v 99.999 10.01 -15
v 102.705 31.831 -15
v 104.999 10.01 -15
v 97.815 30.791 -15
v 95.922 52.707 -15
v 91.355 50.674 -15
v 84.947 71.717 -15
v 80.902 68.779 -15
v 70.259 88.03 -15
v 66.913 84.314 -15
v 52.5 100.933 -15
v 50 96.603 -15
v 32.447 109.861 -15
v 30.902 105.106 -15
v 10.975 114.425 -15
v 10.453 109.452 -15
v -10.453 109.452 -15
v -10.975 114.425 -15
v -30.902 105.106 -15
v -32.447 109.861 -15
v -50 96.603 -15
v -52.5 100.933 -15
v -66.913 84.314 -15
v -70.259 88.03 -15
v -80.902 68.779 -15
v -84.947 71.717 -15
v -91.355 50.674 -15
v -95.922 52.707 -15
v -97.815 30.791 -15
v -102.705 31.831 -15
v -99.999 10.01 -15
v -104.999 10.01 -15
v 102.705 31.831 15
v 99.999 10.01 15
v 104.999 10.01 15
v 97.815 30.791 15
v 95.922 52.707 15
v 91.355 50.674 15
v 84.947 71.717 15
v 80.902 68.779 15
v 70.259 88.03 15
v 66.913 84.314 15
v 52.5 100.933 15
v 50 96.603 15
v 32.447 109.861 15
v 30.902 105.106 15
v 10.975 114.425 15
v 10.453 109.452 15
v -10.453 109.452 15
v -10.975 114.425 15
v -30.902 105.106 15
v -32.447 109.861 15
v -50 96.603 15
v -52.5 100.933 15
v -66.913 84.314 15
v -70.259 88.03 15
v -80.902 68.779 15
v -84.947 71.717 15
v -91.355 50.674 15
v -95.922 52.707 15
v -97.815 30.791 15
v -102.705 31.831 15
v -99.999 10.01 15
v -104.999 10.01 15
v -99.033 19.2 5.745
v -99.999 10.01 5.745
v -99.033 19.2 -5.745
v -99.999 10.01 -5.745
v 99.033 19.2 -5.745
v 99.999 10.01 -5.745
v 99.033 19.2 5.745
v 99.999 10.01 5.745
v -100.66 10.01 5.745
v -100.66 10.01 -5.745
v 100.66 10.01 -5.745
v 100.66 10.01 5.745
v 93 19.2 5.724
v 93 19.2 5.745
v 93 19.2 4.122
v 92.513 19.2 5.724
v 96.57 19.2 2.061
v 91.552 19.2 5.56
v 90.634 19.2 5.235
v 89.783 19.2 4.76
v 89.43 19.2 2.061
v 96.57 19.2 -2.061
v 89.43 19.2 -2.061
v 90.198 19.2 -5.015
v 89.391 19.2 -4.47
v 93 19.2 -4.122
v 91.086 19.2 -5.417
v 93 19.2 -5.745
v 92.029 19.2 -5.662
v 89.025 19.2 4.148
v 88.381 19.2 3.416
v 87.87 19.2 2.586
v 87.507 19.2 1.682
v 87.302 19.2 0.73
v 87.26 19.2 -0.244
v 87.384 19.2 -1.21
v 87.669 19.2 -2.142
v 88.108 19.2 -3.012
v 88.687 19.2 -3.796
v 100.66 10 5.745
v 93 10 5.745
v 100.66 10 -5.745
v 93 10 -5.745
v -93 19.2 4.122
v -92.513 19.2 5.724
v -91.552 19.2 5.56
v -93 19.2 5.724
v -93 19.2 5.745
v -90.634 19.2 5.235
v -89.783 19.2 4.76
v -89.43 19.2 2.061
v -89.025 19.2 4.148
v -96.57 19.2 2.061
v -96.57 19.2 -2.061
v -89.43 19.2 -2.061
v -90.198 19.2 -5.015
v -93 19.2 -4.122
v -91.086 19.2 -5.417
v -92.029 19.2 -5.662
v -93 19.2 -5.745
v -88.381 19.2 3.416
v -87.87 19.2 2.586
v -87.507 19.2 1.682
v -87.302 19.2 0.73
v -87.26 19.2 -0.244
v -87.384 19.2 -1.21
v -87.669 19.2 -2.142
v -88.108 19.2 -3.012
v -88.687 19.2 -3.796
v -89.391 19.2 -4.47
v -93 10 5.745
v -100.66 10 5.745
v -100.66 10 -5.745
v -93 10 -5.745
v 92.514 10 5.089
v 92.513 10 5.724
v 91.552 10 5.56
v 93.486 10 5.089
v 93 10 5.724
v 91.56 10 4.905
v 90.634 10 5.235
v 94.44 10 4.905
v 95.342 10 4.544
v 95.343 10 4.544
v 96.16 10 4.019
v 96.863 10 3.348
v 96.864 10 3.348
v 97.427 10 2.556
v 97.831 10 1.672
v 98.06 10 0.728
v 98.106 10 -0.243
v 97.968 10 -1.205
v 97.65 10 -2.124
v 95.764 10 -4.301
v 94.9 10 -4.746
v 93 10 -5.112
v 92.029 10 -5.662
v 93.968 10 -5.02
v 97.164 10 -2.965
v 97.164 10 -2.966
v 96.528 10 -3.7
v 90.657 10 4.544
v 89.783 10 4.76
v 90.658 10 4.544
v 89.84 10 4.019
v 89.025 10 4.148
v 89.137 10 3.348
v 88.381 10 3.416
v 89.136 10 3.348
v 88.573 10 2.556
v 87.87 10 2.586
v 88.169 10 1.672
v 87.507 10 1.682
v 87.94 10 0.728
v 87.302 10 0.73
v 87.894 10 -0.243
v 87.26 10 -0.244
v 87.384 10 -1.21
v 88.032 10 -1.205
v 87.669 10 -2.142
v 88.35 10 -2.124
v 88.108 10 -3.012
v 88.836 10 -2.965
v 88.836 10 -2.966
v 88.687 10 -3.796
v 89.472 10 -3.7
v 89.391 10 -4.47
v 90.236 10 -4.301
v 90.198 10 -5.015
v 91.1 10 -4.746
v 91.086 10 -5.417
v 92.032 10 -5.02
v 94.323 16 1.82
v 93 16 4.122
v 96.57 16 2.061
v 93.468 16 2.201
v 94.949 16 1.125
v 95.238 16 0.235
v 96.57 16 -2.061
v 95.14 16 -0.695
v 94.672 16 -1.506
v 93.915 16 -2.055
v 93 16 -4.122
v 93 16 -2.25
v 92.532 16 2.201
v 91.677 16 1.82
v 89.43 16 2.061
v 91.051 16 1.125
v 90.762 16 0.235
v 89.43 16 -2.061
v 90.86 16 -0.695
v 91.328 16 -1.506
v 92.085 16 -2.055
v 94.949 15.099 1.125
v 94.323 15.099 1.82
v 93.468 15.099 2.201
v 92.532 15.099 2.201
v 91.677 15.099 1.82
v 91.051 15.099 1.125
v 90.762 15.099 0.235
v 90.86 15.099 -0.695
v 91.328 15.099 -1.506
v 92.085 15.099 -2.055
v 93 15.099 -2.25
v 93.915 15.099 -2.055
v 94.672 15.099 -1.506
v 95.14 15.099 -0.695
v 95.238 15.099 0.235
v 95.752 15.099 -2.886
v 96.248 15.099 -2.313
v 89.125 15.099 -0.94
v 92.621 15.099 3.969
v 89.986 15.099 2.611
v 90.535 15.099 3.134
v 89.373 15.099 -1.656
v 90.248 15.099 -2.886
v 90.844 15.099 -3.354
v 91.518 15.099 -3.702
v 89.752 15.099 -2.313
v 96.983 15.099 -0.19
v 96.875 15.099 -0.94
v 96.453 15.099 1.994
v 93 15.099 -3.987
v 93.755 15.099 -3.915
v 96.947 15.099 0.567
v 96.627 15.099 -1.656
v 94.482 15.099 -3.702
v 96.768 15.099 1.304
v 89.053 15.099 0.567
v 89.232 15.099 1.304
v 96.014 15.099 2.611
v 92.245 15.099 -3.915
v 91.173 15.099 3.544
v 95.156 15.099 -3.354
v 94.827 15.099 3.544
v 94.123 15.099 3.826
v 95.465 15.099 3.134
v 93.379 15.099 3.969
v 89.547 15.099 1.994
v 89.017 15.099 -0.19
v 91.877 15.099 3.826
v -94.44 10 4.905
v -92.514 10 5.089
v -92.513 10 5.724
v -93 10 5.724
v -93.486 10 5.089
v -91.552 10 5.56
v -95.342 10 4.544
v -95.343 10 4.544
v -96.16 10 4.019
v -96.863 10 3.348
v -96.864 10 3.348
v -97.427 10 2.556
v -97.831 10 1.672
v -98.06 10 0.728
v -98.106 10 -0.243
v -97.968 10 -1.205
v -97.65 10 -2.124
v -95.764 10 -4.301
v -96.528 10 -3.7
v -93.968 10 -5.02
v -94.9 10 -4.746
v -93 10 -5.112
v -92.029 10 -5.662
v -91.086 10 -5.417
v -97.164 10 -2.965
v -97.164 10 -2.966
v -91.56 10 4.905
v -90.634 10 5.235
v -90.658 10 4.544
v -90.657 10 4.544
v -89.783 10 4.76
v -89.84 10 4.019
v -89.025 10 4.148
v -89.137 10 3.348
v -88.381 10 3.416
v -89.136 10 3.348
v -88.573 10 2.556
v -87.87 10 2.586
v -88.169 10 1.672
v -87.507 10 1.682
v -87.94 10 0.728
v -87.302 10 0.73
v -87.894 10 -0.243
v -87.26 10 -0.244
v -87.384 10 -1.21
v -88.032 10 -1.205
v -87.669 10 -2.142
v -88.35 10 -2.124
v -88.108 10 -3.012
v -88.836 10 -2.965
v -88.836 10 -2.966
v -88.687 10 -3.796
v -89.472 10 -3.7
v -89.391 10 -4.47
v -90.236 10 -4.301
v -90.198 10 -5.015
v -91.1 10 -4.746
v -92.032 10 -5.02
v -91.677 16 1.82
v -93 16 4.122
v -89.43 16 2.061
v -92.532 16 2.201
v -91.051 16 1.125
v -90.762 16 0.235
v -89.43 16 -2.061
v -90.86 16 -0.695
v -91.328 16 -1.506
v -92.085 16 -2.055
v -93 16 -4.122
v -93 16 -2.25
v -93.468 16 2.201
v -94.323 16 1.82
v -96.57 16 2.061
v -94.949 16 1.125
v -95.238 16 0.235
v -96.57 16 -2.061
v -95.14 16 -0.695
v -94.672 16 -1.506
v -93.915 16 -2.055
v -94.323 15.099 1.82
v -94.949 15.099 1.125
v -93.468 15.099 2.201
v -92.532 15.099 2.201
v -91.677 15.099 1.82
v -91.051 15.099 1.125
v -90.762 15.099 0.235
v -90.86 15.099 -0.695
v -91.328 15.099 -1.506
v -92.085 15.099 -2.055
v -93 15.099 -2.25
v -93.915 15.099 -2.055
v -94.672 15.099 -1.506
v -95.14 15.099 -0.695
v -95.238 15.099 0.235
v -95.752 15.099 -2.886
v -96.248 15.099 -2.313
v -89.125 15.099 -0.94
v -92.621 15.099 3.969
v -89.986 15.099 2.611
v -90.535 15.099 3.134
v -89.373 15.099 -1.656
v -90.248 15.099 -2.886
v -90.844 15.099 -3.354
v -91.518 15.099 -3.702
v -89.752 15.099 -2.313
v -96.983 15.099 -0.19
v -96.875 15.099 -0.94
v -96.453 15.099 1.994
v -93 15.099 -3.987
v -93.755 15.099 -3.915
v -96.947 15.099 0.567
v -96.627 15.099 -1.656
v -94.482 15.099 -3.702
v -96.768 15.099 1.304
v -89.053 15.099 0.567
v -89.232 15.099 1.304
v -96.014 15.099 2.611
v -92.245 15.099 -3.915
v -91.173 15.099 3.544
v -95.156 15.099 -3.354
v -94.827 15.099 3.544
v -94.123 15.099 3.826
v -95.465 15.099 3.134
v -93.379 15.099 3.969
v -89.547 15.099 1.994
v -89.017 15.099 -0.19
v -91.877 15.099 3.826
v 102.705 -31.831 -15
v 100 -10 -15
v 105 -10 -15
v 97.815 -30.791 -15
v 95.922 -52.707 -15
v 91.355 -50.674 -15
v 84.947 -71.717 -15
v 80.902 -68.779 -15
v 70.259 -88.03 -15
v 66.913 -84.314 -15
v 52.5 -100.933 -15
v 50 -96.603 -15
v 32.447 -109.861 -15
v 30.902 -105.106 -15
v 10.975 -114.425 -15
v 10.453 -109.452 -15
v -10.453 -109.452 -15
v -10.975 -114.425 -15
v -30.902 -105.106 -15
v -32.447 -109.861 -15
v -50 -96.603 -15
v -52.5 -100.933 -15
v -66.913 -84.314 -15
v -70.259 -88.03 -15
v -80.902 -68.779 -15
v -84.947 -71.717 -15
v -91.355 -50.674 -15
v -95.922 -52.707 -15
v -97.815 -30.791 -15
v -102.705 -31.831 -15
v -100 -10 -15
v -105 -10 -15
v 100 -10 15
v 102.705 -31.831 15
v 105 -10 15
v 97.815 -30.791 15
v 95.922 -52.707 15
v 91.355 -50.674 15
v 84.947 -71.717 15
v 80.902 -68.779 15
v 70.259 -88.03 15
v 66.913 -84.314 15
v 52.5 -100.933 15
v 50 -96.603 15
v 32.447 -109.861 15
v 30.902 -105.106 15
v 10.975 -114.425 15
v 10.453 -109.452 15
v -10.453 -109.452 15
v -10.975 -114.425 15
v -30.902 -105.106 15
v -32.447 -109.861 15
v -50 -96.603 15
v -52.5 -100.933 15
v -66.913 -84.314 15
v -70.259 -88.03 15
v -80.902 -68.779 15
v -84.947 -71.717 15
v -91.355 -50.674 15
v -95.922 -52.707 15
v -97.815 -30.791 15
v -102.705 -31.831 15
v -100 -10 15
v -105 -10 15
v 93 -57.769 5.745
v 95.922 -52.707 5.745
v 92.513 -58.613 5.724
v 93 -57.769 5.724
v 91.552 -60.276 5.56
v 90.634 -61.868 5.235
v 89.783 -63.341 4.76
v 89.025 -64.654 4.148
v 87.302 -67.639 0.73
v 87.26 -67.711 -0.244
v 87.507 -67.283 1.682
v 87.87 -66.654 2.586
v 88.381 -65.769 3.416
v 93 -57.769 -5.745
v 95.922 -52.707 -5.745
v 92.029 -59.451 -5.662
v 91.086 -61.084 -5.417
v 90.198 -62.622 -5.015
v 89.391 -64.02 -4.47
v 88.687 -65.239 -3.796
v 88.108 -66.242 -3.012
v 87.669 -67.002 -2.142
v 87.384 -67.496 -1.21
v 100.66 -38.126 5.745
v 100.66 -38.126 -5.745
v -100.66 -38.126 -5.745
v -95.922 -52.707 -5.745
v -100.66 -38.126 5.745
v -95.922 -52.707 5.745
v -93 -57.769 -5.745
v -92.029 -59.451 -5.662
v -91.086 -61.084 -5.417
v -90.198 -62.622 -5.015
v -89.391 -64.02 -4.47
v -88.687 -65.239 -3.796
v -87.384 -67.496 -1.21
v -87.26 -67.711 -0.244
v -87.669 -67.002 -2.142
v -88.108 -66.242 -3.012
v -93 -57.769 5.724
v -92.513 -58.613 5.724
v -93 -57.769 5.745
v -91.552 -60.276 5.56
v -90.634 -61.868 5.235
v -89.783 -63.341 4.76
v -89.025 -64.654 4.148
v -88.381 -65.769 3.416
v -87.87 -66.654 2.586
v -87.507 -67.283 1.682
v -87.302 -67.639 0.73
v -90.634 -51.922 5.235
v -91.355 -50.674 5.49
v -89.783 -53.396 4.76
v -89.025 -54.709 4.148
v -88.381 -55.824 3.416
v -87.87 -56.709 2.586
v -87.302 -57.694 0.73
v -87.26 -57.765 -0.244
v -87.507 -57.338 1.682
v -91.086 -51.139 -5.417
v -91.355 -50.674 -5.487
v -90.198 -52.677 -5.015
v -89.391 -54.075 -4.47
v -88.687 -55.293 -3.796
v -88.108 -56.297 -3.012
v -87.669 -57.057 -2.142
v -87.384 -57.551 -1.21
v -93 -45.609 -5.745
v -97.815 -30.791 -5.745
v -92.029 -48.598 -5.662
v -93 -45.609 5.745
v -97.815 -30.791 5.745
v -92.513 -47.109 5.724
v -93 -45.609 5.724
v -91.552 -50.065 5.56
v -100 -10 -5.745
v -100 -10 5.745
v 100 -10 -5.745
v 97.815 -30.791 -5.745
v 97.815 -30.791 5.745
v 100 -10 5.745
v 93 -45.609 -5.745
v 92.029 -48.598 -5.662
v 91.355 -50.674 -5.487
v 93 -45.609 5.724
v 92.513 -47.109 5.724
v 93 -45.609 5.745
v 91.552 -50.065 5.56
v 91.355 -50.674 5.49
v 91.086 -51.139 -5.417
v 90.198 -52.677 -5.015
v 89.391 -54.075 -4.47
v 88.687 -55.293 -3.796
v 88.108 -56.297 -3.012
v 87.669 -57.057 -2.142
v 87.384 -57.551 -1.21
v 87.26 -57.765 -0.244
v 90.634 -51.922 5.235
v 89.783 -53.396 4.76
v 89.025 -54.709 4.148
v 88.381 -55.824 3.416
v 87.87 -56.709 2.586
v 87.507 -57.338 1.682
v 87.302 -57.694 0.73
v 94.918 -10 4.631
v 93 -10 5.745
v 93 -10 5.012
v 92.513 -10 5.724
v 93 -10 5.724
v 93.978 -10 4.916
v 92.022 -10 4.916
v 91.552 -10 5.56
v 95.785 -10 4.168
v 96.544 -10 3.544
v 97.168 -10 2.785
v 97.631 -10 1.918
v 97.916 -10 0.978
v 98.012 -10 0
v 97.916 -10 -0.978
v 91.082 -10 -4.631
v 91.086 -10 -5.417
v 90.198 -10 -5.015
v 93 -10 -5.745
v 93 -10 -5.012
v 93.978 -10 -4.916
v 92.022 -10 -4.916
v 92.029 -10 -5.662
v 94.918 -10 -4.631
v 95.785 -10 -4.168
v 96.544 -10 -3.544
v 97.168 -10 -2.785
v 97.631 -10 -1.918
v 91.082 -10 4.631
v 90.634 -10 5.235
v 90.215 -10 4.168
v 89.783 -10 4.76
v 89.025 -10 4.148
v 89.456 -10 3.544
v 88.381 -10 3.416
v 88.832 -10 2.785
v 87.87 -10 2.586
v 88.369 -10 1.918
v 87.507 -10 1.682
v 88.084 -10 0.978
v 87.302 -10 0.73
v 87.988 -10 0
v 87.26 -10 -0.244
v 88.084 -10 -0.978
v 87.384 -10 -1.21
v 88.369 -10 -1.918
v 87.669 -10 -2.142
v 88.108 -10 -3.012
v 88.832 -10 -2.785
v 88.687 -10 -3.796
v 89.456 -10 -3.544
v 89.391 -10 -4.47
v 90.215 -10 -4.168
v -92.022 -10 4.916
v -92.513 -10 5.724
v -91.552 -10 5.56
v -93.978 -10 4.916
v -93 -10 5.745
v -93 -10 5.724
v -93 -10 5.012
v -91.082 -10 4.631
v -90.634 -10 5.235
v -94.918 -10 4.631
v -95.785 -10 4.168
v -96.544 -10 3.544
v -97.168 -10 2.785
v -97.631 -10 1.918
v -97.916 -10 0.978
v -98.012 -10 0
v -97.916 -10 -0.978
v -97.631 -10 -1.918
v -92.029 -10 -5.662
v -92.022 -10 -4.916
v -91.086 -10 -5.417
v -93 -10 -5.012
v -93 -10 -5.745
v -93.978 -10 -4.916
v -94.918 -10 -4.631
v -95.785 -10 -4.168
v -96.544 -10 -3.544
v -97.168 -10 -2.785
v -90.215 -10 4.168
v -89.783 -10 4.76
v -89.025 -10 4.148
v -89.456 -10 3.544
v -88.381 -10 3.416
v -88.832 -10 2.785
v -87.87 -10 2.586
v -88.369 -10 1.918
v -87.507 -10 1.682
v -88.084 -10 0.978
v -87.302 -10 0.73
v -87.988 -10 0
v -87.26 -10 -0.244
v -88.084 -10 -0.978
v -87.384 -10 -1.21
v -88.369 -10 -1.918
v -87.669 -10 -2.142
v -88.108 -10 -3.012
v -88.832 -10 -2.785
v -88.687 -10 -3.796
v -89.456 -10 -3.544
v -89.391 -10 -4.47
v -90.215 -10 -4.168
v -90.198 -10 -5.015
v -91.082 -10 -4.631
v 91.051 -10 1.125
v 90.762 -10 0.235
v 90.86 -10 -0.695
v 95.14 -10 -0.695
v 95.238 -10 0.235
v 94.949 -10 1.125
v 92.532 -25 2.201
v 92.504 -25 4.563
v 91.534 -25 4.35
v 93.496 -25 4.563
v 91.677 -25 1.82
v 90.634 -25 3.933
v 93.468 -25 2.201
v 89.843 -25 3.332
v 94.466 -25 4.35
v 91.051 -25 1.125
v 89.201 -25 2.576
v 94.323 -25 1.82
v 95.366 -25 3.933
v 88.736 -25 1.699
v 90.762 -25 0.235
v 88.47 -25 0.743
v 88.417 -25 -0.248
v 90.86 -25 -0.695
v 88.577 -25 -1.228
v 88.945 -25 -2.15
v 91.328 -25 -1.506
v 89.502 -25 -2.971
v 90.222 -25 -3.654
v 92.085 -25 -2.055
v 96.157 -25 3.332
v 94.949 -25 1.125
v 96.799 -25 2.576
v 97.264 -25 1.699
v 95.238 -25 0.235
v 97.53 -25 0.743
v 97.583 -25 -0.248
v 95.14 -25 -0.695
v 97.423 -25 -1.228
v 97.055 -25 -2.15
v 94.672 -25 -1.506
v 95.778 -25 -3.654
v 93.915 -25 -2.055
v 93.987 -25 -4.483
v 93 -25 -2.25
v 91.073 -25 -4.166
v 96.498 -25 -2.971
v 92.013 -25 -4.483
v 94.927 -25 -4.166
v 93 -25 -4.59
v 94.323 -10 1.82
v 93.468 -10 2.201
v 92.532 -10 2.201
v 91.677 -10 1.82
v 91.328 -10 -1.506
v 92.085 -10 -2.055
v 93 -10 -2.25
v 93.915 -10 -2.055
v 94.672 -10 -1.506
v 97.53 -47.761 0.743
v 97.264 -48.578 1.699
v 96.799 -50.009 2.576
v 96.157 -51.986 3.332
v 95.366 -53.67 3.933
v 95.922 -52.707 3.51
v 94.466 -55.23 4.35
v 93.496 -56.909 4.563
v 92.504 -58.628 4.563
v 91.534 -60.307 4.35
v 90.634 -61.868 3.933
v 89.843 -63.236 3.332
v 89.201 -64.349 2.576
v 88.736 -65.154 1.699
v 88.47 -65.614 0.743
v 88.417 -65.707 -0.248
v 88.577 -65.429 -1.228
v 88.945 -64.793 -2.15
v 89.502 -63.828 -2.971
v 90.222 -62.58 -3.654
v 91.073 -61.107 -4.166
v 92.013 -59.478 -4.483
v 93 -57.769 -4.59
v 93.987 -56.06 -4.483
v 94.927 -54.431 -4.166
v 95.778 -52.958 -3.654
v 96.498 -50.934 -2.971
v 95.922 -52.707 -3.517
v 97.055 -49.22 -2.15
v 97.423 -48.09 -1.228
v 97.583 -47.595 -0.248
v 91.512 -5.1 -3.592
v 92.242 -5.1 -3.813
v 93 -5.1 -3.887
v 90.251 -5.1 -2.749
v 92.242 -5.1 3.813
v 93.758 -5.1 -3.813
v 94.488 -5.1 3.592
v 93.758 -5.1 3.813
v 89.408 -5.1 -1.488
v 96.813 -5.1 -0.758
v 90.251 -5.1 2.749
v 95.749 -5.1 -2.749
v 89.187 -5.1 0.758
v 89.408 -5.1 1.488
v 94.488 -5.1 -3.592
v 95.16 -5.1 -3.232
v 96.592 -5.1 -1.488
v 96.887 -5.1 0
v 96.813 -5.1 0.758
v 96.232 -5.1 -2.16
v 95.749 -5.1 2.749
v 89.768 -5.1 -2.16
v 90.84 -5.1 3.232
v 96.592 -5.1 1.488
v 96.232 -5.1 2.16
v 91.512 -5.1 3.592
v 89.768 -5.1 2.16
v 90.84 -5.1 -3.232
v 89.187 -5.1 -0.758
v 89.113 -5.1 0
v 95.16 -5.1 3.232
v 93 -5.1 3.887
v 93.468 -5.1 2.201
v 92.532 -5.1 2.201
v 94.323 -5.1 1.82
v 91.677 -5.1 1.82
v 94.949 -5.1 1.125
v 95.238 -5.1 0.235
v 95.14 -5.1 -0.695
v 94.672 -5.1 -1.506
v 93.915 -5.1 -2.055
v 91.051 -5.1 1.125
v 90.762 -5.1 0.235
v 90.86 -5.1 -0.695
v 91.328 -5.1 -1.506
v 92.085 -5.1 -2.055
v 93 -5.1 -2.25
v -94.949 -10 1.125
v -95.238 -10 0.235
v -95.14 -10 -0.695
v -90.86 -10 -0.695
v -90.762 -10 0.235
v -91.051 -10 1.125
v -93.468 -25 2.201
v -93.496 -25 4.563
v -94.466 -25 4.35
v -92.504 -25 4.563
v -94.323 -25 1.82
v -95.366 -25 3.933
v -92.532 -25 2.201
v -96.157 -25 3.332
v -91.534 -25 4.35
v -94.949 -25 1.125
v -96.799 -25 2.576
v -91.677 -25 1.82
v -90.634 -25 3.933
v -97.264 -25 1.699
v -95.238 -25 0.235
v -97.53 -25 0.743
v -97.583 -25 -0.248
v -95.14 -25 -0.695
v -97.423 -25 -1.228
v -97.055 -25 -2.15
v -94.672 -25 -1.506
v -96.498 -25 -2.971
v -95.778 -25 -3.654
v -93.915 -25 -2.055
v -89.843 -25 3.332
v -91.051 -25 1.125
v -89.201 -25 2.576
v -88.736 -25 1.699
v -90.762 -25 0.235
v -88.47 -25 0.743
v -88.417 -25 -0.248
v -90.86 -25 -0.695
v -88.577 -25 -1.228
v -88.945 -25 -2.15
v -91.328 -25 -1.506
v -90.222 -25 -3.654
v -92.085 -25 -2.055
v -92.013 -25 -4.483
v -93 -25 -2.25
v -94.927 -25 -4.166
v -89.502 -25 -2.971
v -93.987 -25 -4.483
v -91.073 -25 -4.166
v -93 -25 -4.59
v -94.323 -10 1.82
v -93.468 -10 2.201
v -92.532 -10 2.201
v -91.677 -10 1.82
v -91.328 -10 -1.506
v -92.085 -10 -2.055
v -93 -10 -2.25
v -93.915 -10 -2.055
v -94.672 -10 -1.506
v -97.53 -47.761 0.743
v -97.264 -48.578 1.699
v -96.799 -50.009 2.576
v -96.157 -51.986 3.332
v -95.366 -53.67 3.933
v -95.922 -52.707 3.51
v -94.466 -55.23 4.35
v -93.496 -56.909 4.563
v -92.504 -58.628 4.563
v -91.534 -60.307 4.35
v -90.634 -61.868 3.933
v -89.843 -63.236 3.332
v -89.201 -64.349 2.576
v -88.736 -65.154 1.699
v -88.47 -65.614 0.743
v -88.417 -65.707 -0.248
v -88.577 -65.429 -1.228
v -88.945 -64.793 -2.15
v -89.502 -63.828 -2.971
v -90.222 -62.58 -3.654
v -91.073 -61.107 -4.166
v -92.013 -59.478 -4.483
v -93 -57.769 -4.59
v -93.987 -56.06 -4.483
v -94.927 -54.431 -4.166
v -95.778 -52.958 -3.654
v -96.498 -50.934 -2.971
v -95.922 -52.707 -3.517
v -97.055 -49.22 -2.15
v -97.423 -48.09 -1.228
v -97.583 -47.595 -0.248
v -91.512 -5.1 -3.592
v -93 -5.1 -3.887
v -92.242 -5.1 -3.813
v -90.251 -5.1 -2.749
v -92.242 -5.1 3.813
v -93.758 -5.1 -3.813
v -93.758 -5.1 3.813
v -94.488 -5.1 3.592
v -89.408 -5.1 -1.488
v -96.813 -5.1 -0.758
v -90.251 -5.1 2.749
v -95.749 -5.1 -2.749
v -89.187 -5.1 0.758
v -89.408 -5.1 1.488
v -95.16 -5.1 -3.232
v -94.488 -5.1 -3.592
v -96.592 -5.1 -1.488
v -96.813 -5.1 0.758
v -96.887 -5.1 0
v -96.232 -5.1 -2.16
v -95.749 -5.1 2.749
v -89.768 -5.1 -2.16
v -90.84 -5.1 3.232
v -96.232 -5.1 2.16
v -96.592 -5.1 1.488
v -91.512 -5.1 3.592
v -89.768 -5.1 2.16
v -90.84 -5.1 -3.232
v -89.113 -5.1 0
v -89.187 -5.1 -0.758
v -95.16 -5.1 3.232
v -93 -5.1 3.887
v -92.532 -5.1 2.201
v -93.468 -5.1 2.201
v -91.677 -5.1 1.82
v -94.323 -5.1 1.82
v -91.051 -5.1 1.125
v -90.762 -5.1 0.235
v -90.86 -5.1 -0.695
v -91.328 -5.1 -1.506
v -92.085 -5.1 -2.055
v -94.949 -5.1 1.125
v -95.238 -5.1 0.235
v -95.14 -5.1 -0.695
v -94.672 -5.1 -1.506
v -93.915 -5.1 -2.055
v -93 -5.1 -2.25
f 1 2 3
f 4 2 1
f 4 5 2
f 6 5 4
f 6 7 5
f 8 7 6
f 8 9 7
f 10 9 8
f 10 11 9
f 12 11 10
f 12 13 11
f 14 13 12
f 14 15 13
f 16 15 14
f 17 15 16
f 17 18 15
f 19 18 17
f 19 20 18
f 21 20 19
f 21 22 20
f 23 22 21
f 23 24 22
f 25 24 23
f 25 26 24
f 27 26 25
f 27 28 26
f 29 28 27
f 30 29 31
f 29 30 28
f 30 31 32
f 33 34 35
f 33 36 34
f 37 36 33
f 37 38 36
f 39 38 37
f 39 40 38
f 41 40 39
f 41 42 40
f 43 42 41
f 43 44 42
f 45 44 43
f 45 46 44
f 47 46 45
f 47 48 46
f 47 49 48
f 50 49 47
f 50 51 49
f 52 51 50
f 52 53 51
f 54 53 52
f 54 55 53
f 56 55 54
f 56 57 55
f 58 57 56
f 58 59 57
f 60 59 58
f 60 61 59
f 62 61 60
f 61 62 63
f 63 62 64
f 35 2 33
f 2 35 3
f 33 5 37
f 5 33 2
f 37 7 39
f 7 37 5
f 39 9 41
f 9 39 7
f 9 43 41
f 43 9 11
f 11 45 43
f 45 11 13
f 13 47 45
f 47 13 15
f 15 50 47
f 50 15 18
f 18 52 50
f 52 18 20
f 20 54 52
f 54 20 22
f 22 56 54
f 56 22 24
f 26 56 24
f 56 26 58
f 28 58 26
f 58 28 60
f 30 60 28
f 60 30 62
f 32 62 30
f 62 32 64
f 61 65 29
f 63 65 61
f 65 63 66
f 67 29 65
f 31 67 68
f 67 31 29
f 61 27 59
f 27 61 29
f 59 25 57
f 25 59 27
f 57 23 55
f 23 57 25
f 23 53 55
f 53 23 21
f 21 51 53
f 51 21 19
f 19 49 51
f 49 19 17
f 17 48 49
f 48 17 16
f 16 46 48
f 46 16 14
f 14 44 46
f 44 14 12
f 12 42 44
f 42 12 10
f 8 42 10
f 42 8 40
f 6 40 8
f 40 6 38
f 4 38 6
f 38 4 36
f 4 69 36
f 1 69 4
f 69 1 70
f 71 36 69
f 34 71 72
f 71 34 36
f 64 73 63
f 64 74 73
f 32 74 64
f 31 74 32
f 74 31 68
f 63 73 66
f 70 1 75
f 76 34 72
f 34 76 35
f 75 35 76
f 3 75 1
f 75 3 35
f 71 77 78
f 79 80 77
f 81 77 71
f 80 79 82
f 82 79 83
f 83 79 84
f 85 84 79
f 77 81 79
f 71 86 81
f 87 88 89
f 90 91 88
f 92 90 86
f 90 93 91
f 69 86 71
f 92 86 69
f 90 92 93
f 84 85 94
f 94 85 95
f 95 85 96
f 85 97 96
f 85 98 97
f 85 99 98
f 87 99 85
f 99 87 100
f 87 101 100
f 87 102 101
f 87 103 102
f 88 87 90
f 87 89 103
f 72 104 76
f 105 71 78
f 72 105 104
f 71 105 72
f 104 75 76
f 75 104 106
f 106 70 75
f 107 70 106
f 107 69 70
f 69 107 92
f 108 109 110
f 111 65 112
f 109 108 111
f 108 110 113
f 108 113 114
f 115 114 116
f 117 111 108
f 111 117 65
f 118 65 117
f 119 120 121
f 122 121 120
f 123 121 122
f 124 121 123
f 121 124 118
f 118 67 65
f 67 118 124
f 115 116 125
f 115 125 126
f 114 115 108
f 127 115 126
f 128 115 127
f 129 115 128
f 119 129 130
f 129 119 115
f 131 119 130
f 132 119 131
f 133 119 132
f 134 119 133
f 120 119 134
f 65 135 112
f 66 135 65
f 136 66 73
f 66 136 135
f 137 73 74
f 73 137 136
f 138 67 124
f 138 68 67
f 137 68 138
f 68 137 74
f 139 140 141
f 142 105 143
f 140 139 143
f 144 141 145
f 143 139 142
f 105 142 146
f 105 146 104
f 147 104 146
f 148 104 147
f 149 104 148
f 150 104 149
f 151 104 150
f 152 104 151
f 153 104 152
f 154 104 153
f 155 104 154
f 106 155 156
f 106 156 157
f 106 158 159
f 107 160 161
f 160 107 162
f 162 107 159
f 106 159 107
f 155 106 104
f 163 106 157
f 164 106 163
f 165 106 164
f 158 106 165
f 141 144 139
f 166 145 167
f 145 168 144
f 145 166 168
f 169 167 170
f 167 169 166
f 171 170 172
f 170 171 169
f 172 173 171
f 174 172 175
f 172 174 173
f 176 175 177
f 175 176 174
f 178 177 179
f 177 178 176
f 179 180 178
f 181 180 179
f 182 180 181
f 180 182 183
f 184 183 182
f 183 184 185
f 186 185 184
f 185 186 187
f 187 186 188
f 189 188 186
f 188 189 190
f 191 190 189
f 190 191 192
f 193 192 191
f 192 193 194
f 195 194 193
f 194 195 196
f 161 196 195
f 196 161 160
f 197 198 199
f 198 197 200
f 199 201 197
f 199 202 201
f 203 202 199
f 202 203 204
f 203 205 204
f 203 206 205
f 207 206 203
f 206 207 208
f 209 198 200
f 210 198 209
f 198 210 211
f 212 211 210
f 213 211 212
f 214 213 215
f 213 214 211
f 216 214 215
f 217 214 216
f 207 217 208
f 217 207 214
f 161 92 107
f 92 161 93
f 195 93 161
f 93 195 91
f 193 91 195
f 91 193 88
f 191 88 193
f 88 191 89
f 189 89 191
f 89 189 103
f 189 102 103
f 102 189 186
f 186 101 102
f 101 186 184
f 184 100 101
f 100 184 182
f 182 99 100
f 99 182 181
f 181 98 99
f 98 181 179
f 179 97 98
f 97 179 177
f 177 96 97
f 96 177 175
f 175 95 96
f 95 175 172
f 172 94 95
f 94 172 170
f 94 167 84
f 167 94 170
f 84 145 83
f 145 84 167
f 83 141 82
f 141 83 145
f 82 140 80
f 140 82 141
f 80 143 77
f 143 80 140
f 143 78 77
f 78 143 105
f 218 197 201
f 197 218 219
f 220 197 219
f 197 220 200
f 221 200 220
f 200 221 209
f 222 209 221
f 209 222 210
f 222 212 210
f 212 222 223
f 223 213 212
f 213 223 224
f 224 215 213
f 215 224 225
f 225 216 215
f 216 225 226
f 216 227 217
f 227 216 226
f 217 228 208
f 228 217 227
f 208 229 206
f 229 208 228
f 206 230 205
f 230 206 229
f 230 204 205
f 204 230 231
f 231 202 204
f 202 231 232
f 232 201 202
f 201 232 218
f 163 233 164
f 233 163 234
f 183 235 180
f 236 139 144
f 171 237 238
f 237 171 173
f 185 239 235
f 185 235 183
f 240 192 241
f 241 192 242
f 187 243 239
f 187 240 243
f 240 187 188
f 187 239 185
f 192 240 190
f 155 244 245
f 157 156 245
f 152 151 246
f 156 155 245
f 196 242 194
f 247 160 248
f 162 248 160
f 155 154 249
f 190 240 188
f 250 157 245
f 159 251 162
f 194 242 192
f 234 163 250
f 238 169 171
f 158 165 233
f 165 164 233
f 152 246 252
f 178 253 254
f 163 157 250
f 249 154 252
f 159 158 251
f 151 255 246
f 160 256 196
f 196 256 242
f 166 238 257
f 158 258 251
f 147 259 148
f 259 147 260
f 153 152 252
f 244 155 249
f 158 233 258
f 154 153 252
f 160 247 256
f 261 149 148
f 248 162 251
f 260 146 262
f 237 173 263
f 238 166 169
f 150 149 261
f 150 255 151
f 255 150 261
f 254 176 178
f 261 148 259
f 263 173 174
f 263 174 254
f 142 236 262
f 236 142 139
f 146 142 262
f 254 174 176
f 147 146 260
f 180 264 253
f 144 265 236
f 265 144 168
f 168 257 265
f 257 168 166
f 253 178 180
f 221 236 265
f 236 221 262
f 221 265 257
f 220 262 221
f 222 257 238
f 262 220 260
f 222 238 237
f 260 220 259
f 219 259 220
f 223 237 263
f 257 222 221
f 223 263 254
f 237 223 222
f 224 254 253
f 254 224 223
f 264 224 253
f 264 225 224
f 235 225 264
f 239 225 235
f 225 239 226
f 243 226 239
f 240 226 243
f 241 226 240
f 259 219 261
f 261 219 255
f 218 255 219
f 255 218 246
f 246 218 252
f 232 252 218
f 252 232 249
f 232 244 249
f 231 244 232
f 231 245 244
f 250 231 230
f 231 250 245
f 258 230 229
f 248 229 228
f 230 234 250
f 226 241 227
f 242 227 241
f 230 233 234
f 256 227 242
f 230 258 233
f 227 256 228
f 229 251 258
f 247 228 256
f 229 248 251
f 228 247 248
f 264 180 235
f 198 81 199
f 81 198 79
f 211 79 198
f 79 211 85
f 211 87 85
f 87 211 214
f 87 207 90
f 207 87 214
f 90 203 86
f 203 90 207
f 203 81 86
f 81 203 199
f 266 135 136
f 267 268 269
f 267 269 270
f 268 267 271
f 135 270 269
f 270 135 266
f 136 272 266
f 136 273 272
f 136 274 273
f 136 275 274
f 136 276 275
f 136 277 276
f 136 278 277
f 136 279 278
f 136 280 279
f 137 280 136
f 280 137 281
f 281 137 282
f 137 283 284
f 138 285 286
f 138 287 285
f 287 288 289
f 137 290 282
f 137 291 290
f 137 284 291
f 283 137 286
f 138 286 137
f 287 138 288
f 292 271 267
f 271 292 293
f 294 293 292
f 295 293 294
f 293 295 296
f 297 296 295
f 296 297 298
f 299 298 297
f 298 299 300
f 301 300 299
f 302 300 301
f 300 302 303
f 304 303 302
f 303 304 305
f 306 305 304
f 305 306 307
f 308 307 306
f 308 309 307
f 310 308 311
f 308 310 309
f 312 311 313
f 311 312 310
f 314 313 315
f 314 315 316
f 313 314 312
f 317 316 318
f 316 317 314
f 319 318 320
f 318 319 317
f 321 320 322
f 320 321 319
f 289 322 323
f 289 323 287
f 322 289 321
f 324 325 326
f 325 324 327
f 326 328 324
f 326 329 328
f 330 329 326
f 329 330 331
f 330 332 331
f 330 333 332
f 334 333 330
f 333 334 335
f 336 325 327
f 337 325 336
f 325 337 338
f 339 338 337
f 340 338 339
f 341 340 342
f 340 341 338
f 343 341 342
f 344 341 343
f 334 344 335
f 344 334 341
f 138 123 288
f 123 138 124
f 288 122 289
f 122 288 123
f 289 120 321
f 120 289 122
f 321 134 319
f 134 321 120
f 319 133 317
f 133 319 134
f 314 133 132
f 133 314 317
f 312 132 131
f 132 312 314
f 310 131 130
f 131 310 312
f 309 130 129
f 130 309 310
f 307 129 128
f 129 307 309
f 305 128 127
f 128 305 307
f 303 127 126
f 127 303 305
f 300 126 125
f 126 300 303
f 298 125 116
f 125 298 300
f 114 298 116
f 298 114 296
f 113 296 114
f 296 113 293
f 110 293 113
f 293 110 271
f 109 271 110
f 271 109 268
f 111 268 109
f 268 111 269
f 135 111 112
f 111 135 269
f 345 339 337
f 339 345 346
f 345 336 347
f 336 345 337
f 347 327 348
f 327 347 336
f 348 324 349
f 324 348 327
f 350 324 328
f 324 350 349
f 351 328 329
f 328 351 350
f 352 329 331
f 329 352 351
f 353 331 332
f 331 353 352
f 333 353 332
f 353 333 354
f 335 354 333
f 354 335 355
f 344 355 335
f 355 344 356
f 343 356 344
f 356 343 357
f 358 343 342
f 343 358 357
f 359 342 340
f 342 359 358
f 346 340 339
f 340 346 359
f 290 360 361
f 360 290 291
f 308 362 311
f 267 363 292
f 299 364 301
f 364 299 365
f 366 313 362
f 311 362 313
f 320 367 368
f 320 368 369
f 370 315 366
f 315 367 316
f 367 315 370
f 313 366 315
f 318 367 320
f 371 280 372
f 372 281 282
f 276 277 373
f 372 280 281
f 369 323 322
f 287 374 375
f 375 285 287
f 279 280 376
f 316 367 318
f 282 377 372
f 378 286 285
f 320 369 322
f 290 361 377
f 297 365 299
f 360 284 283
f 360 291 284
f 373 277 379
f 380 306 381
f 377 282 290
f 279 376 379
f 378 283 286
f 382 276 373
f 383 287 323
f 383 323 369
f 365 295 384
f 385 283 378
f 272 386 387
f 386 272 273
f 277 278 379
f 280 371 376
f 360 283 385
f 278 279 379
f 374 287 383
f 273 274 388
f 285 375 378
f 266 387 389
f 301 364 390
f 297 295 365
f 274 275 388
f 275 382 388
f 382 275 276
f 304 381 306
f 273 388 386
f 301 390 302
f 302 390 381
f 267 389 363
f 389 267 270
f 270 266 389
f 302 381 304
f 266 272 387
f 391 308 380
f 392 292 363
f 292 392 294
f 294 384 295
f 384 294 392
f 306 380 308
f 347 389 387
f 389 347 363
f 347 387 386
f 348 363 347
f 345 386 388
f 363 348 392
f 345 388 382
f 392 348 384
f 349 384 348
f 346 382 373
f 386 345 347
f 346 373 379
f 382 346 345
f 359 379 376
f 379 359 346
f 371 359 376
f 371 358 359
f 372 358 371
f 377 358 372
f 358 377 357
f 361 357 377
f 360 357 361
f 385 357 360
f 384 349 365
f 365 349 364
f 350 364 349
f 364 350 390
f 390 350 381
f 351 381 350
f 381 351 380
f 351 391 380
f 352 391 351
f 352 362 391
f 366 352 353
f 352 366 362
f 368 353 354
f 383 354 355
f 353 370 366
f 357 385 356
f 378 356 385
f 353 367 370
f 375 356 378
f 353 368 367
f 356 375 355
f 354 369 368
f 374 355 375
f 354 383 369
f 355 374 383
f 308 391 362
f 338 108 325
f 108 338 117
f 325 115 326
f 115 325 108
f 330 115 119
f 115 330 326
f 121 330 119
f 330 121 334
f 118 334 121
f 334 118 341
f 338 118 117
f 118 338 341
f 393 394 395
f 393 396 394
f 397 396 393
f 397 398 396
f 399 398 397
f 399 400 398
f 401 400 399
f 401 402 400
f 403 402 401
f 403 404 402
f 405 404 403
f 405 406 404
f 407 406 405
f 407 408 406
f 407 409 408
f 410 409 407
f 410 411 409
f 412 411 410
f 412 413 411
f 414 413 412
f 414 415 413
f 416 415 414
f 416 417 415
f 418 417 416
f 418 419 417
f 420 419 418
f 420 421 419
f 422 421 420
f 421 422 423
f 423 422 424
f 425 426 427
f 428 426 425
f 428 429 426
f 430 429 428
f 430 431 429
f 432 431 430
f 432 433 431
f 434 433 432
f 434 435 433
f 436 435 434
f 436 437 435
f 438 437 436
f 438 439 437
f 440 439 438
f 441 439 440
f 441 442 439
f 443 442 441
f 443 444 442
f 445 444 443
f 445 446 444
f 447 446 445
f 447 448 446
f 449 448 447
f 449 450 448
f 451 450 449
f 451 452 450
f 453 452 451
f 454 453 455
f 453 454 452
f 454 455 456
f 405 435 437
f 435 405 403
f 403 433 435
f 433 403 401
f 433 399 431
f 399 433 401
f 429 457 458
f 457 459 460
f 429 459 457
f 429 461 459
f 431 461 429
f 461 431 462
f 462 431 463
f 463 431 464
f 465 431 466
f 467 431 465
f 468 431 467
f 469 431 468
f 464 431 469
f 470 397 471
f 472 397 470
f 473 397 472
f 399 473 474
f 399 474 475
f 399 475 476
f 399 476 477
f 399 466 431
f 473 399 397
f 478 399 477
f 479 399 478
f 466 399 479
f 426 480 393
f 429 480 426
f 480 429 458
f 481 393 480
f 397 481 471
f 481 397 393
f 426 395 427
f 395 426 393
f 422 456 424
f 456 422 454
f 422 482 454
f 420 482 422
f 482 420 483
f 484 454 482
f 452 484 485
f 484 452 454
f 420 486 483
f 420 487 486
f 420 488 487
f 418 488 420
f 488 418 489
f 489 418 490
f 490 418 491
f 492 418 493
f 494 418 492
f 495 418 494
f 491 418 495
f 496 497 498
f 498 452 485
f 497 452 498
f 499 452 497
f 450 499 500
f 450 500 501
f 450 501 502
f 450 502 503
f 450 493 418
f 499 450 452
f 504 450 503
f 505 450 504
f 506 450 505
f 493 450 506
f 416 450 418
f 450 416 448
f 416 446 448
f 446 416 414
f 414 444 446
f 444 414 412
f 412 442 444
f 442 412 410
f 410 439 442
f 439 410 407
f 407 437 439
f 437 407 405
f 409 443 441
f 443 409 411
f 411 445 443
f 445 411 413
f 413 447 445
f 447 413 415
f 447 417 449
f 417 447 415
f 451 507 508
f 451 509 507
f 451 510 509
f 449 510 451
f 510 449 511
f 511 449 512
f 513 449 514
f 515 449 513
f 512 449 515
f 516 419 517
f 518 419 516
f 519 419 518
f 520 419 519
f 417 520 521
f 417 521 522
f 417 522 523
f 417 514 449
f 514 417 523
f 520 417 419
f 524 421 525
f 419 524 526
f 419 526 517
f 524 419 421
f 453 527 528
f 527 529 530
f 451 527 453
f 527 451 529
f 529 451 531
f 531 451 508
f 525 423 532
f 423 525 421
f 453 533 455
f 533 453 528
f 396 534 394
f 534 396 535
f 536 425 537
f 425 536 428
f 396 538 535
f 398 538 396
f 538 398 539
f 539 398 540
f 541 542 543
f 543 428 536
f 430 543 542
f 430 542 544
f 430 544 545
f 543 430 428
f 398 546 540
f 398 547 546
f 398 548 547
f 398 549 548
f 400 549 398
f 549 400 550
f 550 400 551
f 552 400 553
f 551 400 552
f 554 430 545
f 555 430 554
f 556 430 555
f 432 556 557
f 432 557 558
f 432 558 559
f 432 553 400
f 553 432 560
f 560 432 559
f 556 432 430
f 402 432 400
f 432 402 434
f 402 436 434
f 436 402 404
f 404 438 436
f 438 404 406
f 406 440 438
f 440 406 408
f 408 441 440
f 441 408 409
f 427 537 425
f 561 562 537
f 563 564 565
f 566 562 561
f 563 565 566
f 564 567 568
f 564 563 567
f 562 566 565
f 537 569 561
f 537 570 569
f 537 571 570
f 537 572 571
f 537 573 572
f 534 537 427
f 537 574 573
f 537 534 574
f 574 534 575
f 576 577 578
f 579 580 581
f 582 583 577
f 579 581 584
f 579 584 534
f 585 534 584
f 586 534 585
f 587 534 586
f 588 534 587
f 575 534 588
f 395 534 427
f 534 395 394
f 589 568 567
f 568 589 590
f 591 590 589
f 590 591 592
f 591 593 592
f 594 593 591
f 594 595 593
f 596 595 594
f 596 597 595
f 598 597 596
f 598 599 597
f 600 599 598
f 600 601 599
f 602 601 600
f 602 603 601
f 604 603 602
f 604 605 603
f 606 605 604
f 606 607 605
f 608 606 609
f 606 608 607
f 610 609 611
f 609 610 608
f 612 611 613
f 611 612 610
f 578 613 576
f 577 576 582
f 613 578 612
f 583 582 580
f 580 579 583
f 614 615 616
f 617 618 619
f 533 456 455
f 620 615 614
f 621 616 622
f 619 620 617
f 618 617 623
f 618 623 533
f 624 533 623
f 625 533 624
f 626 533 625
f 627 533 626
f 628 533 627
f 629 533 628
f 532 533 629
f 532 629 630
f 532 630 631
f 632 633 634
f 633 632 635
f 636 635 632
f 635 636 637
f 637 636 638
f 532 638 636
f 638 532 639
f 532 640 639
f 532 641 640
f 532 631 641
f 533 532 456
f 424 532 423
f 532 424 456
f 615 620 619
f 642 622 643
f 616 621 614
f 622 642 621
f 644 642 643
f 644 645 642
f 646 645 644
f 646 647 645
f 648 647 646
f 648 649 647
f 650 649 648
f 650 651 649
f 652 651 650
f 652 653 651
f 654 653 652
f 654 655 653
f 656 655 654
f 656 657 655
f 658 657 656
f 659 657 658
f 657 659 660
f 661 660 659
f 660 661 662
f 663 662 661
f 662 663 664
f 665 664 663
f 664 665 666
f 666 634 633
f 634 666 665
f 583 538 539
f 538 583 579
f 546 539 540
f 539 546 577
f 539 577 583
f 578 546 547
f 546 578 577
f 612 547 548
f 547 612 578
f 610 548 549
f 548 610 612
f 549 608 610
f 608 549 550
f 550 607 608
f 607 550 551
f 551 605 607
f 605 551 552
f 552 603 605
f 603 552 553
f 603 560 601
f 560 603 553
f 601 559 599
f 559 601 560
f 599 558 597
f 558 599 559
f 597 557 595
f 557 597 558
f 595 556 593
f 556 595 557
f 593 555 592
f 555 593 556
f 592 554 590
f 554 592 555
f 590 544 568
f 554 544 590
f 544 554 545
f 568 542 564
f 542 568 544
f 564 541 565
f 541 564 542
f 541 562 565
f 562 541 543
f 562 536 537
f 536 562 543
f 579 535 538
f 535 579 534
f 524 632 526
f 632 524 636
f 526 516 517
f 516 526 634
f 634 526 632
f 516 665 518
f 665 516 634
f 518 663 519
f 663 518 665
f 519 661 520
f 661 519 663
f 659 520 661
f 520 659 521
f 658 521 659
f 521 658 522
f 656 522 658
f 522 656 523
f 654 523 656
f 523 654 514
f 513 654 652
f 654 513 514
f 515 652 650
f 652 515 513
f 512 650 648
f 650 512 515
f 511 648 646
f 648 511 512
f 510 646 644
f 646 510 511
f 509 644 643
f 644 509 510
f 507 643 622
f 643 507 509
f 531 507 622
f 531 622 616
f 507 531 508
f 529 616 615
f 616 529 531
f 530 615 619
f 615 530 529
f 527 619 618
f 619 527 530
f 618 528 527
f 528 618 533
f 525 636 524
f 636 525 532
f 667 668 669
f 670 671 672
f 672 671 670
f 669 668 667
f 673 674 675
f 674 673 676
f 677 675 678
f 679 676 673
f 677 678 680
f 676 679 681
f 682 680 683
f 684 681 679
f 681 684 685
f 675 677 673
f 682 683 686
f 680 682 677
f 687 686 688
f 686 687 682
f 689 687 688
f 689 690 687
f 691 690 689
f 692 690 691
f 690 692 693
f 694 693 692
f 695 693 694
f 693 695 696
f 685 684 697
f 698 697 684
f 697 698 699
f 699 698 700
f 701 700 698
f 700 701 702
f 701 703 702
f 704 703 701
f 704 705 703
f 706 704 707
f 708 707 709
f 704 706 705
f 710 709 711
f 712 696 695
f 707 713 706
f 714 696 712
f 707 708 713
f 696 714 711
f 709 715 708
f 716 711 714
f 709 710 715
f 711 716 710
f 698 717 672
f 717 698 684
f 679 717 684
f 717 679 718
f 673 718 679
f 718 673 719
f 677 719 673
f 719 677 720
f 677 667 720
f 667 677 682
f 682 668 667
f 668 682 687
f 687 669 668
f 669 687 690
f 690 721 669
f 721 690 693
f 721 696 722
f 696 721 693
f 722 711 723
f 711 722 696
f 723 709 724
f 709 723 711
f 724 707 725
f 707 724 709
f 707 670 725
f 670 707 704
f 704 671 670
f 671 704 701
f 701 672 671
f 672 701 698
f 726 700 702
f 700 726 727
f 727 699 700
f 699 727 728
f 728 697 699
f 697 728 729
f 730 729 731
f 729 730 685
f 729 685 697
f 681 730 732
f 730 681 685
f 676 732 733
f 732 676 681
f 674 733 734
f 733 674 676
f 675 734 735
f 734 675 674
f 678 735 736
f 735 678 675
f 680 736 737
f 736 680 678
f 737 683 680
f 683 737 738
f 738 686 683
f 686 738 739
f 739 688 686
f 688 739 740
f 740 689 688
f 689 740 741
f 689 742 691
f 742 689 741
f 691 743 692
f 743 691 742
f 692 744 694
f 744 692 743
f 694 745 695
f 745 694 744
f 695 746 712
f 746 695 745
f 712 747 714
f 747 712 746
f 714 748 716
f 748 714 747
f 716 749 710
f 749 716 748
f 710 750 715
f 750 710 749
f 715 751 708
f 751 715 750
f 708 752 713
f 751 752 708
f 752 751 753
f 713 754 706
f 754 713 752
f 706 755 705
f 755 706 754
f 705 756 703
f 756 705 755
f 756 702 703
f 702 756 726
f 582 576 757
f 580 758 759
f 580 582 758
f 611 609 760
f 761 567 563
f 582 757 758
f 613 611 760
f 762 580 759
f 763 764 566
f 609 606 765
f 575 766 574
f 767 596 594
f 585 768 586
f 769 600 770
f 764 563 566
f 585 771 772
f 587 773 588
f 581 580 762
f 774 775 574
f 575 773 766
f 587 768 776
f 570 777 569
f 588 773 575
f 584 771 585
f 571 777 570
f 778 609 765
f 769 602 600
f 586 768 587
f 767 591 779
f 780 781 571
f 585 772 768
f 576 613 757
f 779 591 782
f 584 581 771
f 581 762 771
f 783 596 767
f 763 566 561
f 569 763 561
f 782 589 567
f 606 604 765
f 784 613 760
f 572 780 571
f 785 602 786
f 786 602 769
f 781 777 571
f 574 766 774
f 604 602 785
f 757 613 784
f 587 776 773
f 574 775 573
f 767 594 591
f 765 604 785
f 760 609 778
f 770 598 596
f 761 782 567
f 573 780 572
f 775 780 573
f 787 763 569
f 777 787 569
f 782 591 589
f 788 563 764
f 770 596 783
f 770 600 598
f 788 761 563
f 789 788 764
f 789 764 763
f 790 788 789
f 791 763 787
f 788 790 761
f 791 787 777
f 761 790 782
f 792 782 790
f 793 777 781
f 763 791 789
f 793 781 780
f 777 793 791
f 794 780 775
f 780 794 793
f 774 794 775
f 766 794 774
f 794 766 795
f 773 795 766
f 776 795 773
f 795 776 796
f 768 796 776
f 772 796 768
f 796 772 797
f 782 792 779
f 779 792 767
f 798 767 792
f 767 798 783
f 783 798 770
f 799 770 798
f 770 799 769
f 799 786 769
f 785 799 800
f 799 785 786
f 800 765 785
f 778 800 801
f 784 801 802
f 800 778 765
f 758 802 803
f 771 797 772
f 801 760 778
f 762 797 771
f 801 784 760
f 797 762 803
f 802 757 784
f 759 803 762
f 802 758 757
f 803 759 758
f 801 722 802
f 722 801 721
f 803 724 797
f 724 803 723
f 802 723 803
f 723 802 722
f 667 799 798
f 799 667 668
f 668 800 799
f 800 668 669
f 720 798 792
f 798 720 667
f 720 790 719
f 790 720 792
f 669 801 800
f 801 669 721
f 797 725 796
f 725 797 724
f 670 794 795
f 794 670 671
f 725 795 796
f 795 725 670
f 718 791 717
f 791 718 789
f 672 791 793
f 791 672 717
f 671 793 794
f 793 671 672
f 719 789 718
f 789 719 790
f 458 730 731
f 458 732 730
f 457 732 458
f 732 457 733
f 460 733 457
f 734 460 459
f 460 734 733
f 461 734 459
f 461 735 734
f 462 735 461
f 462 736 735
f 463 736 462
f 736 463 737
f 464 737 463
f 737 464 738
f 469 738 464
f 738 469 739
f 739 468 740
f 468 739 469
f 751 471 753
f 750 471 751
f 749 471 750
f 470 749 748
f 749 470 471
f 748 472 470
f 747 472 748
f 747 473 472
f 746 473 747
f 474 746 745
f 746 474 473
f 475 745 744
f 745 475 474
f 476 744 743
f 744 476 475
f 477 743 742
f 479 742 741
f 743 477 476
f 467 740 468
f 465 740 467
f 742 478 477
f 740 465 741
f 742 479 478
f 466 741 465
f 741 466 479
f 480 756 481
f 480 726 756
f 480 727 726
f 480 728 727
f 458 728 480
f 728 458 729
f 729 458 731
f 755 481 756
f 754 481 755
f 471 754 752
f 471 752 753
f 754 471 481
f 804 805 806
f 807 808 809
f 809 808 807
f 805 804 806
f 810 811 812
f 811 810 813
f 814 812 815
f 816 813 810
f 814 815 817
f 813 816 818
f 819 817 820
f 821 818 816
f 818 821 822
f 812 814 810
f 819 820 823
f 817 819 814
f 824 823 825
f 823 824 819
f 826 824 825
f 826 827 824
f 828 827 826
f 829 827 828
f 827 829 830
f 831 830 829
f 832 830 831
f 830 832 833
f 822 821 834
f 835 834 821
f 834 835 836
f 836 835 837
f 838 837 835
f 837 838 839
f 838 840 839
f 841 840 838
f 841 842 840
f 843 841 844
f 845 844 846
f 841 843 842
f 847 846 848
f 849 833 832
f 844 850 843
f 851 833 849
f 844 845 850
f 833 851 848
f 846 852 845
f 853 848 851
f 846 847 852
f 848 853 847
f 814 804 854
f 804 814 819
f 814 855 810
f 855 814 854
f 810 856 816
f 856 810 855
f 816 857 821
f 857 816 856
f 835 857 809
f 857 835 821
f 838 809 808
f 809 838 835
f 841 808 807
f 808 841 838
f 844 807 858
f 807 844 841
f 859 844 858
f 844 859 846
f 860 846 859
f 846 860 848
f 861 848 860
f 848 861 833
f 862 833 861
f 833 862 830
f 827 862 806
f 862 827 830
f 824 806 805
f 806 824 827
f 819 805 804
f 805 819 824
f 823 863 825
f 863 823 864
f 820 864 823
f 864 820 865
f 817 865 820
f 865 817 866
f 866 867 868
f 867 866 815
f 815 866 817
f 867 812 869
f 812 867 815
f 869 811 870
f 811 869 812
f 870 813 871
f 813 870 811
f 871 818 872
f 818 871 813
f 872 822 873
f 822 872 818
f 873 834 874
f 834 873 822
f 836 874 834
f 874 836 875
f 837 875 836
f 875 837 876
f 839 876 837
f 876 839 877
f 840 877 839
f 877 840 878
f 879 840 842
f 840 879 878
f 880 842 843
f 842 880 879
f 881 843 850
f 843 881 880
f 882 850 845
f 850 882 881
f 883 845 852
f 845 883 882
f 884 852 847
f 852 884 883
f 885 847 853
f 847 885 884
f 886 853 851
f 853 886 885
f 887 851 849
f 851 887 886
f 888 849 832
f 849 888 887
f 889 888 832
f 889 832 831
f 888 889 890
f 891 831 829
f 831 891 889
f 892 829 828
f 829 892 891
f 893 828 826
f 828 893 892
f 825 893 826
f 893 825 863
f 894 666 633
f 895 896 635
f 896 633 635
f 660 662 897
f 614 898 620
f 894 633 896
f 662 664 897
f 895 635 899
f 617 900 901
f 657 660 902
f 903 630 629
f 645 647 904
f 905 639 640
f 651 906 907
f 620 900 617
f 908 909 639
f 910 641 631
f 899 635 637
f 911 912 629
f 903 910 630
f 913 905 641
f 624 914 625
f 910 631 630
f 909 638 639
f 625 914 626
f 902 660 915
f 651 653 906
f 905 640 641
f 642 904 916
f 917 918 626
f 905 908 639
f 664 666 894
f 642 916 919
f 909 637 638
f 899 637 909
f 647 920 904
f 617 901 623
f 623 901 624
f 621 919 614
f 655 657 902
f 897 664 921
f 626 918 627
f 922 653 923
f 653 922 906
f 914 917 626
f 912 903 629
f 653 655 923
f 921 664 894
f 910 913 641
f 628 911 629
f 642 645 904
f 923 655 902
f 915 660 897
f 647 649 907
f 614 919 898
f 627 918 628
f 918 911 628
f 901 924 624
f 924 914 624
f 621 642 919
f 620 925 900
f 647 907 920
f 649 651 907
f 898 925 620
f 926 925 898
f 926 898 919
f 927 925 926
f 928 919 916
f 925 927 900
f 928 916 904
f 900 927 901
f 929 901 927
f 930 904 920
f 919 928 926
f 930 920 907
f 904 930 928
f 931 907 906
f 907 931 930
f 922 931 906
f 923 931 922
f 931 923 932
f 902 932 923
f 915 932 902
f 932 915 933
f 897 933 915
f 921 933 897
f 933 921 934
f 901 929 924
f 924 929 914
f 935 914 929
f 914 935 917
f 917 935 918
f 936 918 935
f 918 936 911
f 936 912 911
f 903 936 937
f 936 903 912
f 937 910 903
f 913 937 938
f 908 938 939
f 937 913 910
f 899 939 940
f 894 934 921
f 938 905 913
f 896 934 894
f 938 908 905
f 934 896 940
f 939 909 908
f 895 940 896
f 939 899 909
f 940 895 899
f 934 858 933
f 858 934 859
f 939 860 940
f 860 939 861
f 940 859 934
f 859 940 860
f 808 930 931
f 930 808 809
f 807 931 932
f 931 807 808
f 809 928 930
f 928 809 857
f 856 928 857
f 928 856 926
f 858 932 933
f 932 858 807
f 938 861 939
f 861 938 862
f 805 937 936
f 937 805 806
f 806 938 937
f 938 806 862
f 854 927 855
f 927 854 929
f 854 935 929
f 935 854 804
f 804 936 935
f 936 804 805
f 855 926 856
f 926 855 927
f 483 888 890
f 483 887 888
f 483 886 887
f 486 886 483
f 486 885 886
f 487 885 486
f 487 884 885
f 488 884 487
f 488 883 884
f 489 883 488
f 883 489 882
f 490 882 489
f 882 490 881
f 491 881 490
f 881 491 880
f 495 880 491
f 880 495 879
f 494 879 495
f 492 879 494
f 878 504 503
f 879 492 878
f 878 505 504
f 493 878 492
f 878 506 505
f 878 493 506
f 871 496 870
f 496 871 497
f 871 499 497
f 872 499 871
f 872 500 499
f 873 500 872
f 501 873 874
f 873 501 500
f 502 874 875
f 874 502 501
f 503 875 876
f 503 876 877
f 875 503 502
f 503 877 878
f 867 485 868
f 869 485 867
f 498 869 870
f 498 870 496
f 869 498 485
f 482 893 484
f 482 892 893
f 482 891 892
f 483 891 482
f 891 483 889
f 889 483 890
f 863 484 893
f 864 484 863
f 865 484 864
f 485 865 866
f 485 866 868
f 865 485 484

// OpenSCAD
// file: metric_dimensions.scad
// Dimensions a few metric fasteners.
// Author: James Synge
// Units: mm

////////////////////////////////////////////////////////////////////////////////
// Selected metric screw and nut size info (maximum dimensions), ISO 4032.
// For the washers, using standard DIN 125 / ISO 7089:
//    https://www.engineersedge.com/iso_flat_washer.htm

m4_screw_diam = 4;
m4_hole_diam = 4.5;
m4_nut_diam1 = 7;  // Width across the flats
m4_nut_diam2 = 7.66;  // Width across the corners
m4_nut_height = 3.2;
m4_washer_hole_diam = 4.3;
m4_washer_diam = 9;
m4_washer_thickness = 0.8;

m5_screw_diam = 5;
m5_hole_diam = 5.5;
m5_nut_diam1 = 8;  // Width across the flats
m5_nut_diam2 = 8.79;  // Width across the corners
m5_nut_height = 4.7;


// Given the width across a six sided nut (flat side to flat side),
// how wide is the nut from point to farthest point (i.e. what is the
// diameter of the smallest circle that will enclose the nut).
function hex_short_to_long_diag(d) = d * 2.0 / sqrt(3.0);
// file: misc.scad
include <metric_dimensions.scad>


translate([100,0,0]) motor_cover_shell(50, 40, 30, shell_wall=1,
bracing0=10, bracing1=20
);


color("blue")
translate([0,-10,0]) {
  $fn=20;
  symmetric_z_cylinder(6,20);
}

module symmetric_z_cylinder(d=undef, l=undef, r=undef, convexity=3) {
  assert((d>0 && r==undef) || (d==undef && r>0));
  assert(l!=undef && l>0);
  translate([0,0,-l/2])
    linear_extrude(height=l, convexity=convexity)
      circle(d=d, r=r);
}



// Helper for creating the hollow box
// around a motor cover. Has 3 sides,
// not counting those due to the non-zero
// thickness of the shell.
// extra_z is below the z=0 plane.
module motor_cover_shell(motor_w, motor_h, motor_z, motor_gap=2, shell_wall=0, shellw=0, shellh=0, shellz=0, extra_z=0, bracing0=0, bracing1=0) {

  shell_w = max(shell_wall, shellw);
  shell_h = max(shell_wall, shellh);
  shell_z = max(shell_wall, shellz);

  assert(shell_w>0);
  assert(shell_z>0);

  inner_w=motor_w + motor_gap*2;
  inner_z=motor_z + motor_gap + extra_z;
  
  outer_w = inner_w + shell_w * 2;
  outer_z = inner_z + shell_z;

  linear_extrude(height=motor_h, convexity=10) {
    translate([-outer_w/2, -extra_z, 0]) {
      difference() {
        square([outer_w, outer_z], center=false);
        translate([shell_w,0,0])
          square([inner_w, inner_z], center=false);
      }
    }
  }
  
  if (bracing0 > 0) {
    // Add some strength at the z=0 plane.
    assert(shell_h>0);
    linear_extrude(height=shell_wall, convexity=10)
      translate([-outer_w/2, motor_z + motor_gap - bracing0, 0]) 
        square([outer_w, bracing0+shell_wall]);
  }

  if (bracing1 > 0) {
    // Add some strength at the z=motor_h plane.
    assert(shell_h>0);
    translate([0,0, motor_h-shell_wall])
      linear_extrude(height=shell_wall, convexity=10)
        translate([-outer_w/2, motor_z + motor_gap - bracing1, 0]) 
          square([outer_w, bracing1+shell_wall]);
  }
}



translate([0, 0, 50]) nut_slot(nut_diam=10, nut_height=5, depth=15, bolt_diam=5, bolt_up=8, bolt_down=16);

module nut_slot(nut_diam=0, nut_height=0, depth=0, bolt_diam=0, bolt_up=0, bolt_down=0, fn=undef) {
  translate([0, 0, -nut_height/2]) {
    rotate([0,0,360/12])
      linear_extrude(height=nut_height)
        circle(d=hex_short_to_long_diag(nut_diam), $fn=6);
    linear_extrude(height=nut_height)
      translate([-nut_diam/2, 0, 0])
        square([nut_diam, depth], center=false);
  
    assert(bolt_diam >= 0);
    assert(bolt_up >= 0);
    assert(bolt_down >= 0);
  
    if (bolt_diam > 0) {
      if (bolt_up > 0) {
        translate([0,0,nut_height])
          linear_extrude(height=bolt_up)
            circle(d=bolt_diam, $fn=fn);
      }
      if (bolt_down > 0) {
        translate([0,0,-bolt_down])
          linear_extrude(height=bolt_down)
            circle(d=bolt_diam, $fn=fn);
      }
    }
  }
}

module nut(nut_hex_diam=undef, screw_diam=undef, nut_height=undef) {
  linear_extrude(height=nut_height) {
    difference() {
      circle(d=hex_short_to_long_diag(nut_hex_diam), $fn=6);
      circle(d=screw_diam, $fn=30);
    }
  }
}

module screw_gusset(x, y, z, d, center=false, fn=undef) {
  xlate = center ? [0, 0, -z/2] : [x/2, y/2, 0];
  translate(xlate) {
    linear_extrude(height=z, convexity=10) {
      difference() {
        square([x, y], center=true);
        circle(d=d, $fn=fn);
      }
    }
  }
}
translate([0,0,0]) screw_gusset(15,15,10,5, center=true);
translate([0,0,20]) screw_gusset(15,15,10,5);

module demo_screw(shaft_diam, shaft_length, head_diam, head_height) {
  color("silver") {
    cylinder(d=head_diam, h=head_height);
    translate([0, 0, head_height])
      cylinder(d=shaft_diam, h=shaft_length);
  }
}

// Space to be occupied by a nut (show_gusset=false) or a screw gusset (show_gusset=true)
// for the corresponding bolt.
module nut_slot_and_screw_gusset(show_gusset=true, nut_diam=0, nut_height=0, depth=0, bolt_diam=0, bolt_up=0, bolt_down=0, gusset_w=0, gusset_h=0, gusset_z=0, gusset_dist=0, fn=undef) {
  // x_offset = (shell2_outside_x + dec2_radius) / 2;
  // y_offset = nut_height+nut_slot_margin;

  if (show_gusset) {
    z_dist = gusset_dist == 0 ? 0 : (nut_height + gusset_z) / 2 + abs(gusset_dist);
    z_offset = gusset_dist > 0 ? z_dist : -z_dist;
    translate([0, 0, z_offset])
      screw_gusset(gusset_w, gusset_h, gusset_z, bolt_diam, center=true, fn=fn);
  } else {
    nut_slot(nut_diam=nut_diam, nut_height=nut_height,
                   depth=depth,
                   bolt_diam=bolt_diam,
                   bolt_up=bolt_up,
                   bolt_down=bolt_down, fn=fn);
  }
}

module test_nut_slot_and_screw_gusset(show_gusset=true, below=false) {
  gusset_dist = below ? -5 : 10;
  nut_slot_and_screw_gusset(show_gusset=show_gusset, nut_diam=10, nut_height=5, depth=15, bolt_diam=5, bolt_up=30, bolt_down=20, gusset_w=20, gusset_h=12, gusset_z=10, gusset_dist=gusset_dist, fn=20);
}

translate([-50, 0, 0]) {
  test_nut_slot_and_screw_gusset(show_gusset=true, below=false);
  test_nut_slot_and_screw_gusset(show_gusset=false, below=false);
  test_nut_slot_and_screw_gusset(show_gusset=true, below=true);
}









module fillet_outline(radius) {
  intersection() {
    square([radius, radius], center=false);
    translate([radius, radius])
      difference() {
        circle(r=radius*2);
        circle(r=radius);
      };
  }
}

module fillet_extrusion(radius, length, scale=1.0) {
  linear_extrude(height=length, scale=scale)
    fillet_outline(radius);
}
translate([0,-20,0])
fillet_extrusion(5,15,scale=0.5);


module annulus(d1=undef, r1=undef, d2=undef, r2=undef, solid=false) {
  difference() {
    circle(r=r2, d=d2);
    // solid is support for creating solids for CSG operations.
    if (!solid) circle(r=r1, d=d1);
  };
}


module mirrored(v=undef) {
  children();
  mirror(v=v) children();
}
// main file
use <misc.scad>
include <metric_dimensions.scad>
use <paired_gussets.scad>

//echo("cos($t)", cos($t));
distance = 5 * (cos($t*360) + 1);

translate([0, distance, 0]) color("red")
  example(nut_side=true);
translate([0, -distance, 0]) color("green")
  example(nut_side=false);

*translate([0, 0, -40])
  intersection() {
    color("red") example(nut_side=true);
    color("green") example(nut_side=false);
  };

module example(nut_side=true) {
  r1 = 100;
  r2 = 105;
  angle = 0;
  difference() {
    example_body(nut_side=nut_side, r1=r1, r2=r2);
    // Remove from the ring the gussets, which really means removing the holes
    // for the screws.
    mirrored(v=[1,0,0]) {
      matching_rtp_m4_gussets_in_body(nut_side=nut_side, r1=r1, r2=r2, angle=angle, solid=true);
    }
  }
  // The actual gussets.
  mirrored(v=[1,0,0]) {
    matching_rtp_m4_gussets_in_body(nut_side=nut_side, r1=r1, r2=r2, angle=angle, solid=false, do_intersect=true);
  }
}

module example_body(nut_side=undef, r1=undef, r2=undef, solid=false) {
  d2 = r2 * 2;
  translate([0, 0, -15]) {
    if (solid) {
      linear_extrude(height=30, convexity=3)
        circle(r=r2);
    } else {
      intersection() {
        // The whole ring of the helmet.
        linear_extrude(height=30, convexity=3)
          annulus(r1=r1, r2=r2);
        // Cut to be just the upper or lower half (i.e. nut side or screw side).
        if (nut_side) {
          translate([-r2, 0.01, 0])
            cube(size=d2, center=false);
        } else {
          translate([-r2, -d2, 0])
            cube(size=d2, center=false);
        }
      }
    }
  }
}

module matching_rtp_m4_gussets_in_body(nut_side=undef, r1=undef, r2=undef, angle=0, solid=false, do_intersect=false) {
  intersection() {
    matching_rtp_m4_gussets_in_place(nut_side=nut_side, r1=r1, r2=r2, angle=angle, solid=solid);
    if (do_intersect) {
      example_body(nut_side=nut_side, r1=r1, r2=r2, solid=true);
    }
  }
}

module matching_rtp_m4_gussets_in_place(nut_side=undef, r1=undef, r2=undef, angle=0, solid=false) {
  translate([r1-7, 0, 0]) {
    rotate([-90, 0, 0]) {
      rotate([0, 0, 90]) {
        matching_rtp_m4_gussets(nut_side=nut_side, angle=angle, solid=solid);
      }
    }
  }
}

module matching_rtp_m4_gussets(nut_side=undef, angle=0, solid=false) {
  rtp_diam = m4_nut_diam2*1.5;
  rtp_height = m4_nut_diam2;
  matching_m4_recessed_gussets(solid=solid, show_nut_gusset=nut_side, show_screw_gusset=!nut_side, angle=angle) {
    round_top_pyramid(rtp_diam, rtp_height, angle=angle);
  }
}
